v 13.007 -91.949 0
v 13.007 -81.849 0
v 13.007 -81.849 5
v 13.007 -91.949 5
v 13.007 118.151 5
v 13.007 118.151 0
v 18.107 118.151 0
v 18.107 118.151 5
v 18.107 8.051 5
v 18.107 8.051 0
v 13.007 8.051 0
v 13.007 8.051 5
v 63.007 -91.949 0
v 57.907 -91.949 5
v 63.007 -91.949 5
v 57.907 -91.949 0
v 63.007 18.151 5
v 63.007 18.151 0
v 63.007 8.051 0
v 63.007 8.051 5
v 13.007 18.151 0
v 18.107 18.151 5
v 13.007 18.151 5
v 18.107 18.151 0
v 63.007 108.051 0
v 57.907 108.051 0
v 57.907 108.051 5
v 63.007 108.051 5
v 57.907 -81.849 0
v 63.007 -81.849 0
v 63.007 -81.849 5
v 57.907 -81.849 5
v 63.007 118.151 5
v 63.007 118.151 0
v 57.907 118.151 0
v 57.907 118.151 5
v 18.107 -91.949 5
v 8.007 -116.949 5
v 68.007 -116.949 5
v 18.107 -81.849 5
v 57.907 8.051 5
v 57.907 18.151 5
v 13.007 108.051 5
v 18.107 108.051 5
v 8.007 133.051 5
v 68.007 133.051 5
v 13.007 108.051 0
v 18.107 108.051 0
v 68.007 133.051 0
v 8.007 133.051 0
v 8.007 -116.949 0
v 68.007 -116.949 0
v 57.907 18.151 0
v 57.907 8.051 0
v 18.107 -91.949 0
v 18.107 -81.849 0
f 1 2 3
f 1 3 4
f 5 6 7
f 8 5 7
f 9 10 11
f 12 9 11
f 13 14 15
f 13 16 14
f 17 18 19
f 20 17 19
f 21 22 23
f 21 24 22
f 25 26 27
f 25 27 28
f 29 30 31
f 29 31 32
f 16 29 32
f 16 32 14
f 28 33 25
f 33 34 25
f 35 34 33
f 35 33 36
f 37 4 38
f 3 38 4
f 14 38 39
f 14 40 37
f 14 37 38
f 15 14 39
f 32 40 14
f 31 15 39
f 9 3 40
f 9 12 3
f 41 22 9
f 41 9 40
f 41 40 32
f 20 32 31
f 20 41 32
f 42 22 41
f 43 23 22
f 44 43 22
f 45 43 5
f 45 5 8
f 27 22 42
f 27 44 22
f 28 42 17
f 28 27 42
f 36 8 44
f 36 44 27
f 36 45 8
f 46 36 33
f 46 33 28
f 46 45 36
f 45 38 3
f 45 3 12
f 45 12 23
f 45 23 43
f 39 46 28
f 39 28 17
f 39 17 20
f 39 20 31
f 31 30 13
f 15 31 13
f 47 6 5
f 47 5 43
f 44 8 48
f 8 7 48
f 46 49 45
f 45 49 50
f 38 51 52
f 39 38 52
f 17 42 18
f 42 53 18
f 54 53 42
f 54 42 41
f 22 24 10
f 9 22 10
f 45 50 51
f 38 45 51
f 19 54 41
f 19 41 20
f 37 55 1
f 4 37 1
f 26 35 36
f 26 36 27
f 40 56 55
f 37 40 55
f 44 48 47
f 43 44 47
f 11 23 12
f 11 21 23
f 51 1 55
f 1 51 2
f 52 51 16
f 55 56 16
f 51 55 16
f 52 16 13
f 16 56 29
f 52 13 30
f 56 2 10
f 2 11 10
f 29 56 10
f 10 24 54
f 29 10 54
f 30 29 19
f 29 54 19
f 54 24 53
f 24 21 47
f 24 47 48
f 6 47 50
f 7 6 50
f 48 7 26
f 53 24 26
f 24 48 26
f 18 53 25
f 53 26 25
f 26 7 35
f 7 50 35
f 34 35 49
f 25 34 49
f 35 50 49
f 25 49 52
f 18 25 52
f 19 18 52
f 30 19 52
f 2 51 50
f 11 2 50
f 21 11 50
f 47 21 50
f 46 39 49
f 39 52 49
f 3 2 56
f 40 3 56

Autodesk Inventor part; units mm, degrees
ref_plane "YZ Plane" through (0, 0, 0) normal (1, 0, 0) x (0, 1, 0)
ref_plane "XZ Plane" through (0, 0, 0) normal (0, 1, 0) x (-1, 0, 0)
ref_plane "XY Plane" through (0, 0, 0) normal (0, 0, 1) x (1, 0, 0)
sketch "Sketch1" plane through (0, 0, 0) normal (0, 0, 1) x (1, 0, 0)
  line L0 (-1.9934, -116.9491) -> (8.0066, -116.9491) construction
  line L1 (38.0066, 133.0509) -> (38.0066, -116.9491) construction
  line L2 (8.0066, 133.0509) -> (8.0066, -116.9491)
  line L3 (63.0066, 8.0509) -> (63.0066, -81.8491) construction
  line L4 (57.9066, 8.0509) -> (57.9066, -81.8491) construction
  line L5 (8.0066, -116.9491) -> (68.0066, -116.9491)
  line L6 (57.9066, -91.9491) -> (63.0066, -91.9491)
  line L7 (63.0066, -81.8491) -> (57.9066, -81.8491)
  line L8 (68.0066, 133.0509) -> (8.0066, 133.0509)
  line L9 (57.9066, 18.1509) -> (57.9066, 8.0509)
  line L10 (57.9066, 8.0509) -> (63.0066, 8.0509)
  line L11 (18.1066, 18.1509) -> (18.1066, 8.0509)
  line L12 (13.0066, 18.1509) -> (13.0066, 8.0509)
  line L13 (18.1066, 8.0509) -> (13.0066, 8.0509)
  line L14 (63.0066, 18.1509) -> (63.0066, 8.0509)
  line L15 (18.1066, 18.1509) -> (13.0066, 18.1509)
  line L16 (73.0066, 108.0509) -> (8.0066, 108.0509) construction
  line L17 (73.0066, 118.1509) -> (8.0066, 118.1509) construction
  line L18 (63.0066, 118.1509) -> (63.0066, 108.0509)
  line L19 (57.9066, 118.1509) -> (57.9066, 108.0509)
  line L20 (63.0066, 118.1509) -> (57.9066, 118.1509)
  line L21 (57.9066, 108.0509) -> (63.0066, 108.0509)
  line L22 (57.9066, 108.0509) -> (57.9066, 18.1509) construction
  line L23 (63.0066, 108.0509) -> (63.0066, 18.1509) construction
  line L24 (57.9066, 18.1509) -> (63.0066, 18.1509)
  line L25 (57.9066, -81.8491) -> (57.9066, -91.9491)
  line L26 (63.0066, -81.8491) -> (63.0066, -91.9491)
  line L27 (13.0066, -81.8491) -> (18.1066, -81.8491)
  line L28 (13.0066, -81.8491) -> (13.0066, -91.9491)
  line L29 (18.1066, -81.8491) -> (18.1066, -91.9491)
  line L30 (18.1066, -91.9491) -> (13.0066, -91.9491)
  line L31 (-1.9934, -91.9491) -> (68.0066, -91.9491) construction
  line L32 (8.0066, -116.9491) -> (-1.9934, -116.9491) construction
  line L33 (-1.9934, -81.8491) -> (68.0066, -81.8491) construction
  line L34 (3.0066, 108.0509) -> (68.0066, 108.0509) construction
  line L35 (3.0066, 118.1509) -> (68.0066, 118.1509) construction
  line L36 (18.1066, 108.0509) -> (13.0066, 108.0509)
  line L37 (13.0066, 118.1509) -> (13.0066, 108.0509)
  line L38 (13.0066, 118.1509) -> (18.1066, 118.1509)
  line L39 (18.1066, 118.1509) -> (18.1066, 108.0509)
  line L40 (68.0066, -116.9491) -> (68.0066, 133.0509)
  point P0 (0, 0)
extrude "Extrusion1" add sketch "Sketch1" along normal blind 5
properties part number "Lifting Sections right"
